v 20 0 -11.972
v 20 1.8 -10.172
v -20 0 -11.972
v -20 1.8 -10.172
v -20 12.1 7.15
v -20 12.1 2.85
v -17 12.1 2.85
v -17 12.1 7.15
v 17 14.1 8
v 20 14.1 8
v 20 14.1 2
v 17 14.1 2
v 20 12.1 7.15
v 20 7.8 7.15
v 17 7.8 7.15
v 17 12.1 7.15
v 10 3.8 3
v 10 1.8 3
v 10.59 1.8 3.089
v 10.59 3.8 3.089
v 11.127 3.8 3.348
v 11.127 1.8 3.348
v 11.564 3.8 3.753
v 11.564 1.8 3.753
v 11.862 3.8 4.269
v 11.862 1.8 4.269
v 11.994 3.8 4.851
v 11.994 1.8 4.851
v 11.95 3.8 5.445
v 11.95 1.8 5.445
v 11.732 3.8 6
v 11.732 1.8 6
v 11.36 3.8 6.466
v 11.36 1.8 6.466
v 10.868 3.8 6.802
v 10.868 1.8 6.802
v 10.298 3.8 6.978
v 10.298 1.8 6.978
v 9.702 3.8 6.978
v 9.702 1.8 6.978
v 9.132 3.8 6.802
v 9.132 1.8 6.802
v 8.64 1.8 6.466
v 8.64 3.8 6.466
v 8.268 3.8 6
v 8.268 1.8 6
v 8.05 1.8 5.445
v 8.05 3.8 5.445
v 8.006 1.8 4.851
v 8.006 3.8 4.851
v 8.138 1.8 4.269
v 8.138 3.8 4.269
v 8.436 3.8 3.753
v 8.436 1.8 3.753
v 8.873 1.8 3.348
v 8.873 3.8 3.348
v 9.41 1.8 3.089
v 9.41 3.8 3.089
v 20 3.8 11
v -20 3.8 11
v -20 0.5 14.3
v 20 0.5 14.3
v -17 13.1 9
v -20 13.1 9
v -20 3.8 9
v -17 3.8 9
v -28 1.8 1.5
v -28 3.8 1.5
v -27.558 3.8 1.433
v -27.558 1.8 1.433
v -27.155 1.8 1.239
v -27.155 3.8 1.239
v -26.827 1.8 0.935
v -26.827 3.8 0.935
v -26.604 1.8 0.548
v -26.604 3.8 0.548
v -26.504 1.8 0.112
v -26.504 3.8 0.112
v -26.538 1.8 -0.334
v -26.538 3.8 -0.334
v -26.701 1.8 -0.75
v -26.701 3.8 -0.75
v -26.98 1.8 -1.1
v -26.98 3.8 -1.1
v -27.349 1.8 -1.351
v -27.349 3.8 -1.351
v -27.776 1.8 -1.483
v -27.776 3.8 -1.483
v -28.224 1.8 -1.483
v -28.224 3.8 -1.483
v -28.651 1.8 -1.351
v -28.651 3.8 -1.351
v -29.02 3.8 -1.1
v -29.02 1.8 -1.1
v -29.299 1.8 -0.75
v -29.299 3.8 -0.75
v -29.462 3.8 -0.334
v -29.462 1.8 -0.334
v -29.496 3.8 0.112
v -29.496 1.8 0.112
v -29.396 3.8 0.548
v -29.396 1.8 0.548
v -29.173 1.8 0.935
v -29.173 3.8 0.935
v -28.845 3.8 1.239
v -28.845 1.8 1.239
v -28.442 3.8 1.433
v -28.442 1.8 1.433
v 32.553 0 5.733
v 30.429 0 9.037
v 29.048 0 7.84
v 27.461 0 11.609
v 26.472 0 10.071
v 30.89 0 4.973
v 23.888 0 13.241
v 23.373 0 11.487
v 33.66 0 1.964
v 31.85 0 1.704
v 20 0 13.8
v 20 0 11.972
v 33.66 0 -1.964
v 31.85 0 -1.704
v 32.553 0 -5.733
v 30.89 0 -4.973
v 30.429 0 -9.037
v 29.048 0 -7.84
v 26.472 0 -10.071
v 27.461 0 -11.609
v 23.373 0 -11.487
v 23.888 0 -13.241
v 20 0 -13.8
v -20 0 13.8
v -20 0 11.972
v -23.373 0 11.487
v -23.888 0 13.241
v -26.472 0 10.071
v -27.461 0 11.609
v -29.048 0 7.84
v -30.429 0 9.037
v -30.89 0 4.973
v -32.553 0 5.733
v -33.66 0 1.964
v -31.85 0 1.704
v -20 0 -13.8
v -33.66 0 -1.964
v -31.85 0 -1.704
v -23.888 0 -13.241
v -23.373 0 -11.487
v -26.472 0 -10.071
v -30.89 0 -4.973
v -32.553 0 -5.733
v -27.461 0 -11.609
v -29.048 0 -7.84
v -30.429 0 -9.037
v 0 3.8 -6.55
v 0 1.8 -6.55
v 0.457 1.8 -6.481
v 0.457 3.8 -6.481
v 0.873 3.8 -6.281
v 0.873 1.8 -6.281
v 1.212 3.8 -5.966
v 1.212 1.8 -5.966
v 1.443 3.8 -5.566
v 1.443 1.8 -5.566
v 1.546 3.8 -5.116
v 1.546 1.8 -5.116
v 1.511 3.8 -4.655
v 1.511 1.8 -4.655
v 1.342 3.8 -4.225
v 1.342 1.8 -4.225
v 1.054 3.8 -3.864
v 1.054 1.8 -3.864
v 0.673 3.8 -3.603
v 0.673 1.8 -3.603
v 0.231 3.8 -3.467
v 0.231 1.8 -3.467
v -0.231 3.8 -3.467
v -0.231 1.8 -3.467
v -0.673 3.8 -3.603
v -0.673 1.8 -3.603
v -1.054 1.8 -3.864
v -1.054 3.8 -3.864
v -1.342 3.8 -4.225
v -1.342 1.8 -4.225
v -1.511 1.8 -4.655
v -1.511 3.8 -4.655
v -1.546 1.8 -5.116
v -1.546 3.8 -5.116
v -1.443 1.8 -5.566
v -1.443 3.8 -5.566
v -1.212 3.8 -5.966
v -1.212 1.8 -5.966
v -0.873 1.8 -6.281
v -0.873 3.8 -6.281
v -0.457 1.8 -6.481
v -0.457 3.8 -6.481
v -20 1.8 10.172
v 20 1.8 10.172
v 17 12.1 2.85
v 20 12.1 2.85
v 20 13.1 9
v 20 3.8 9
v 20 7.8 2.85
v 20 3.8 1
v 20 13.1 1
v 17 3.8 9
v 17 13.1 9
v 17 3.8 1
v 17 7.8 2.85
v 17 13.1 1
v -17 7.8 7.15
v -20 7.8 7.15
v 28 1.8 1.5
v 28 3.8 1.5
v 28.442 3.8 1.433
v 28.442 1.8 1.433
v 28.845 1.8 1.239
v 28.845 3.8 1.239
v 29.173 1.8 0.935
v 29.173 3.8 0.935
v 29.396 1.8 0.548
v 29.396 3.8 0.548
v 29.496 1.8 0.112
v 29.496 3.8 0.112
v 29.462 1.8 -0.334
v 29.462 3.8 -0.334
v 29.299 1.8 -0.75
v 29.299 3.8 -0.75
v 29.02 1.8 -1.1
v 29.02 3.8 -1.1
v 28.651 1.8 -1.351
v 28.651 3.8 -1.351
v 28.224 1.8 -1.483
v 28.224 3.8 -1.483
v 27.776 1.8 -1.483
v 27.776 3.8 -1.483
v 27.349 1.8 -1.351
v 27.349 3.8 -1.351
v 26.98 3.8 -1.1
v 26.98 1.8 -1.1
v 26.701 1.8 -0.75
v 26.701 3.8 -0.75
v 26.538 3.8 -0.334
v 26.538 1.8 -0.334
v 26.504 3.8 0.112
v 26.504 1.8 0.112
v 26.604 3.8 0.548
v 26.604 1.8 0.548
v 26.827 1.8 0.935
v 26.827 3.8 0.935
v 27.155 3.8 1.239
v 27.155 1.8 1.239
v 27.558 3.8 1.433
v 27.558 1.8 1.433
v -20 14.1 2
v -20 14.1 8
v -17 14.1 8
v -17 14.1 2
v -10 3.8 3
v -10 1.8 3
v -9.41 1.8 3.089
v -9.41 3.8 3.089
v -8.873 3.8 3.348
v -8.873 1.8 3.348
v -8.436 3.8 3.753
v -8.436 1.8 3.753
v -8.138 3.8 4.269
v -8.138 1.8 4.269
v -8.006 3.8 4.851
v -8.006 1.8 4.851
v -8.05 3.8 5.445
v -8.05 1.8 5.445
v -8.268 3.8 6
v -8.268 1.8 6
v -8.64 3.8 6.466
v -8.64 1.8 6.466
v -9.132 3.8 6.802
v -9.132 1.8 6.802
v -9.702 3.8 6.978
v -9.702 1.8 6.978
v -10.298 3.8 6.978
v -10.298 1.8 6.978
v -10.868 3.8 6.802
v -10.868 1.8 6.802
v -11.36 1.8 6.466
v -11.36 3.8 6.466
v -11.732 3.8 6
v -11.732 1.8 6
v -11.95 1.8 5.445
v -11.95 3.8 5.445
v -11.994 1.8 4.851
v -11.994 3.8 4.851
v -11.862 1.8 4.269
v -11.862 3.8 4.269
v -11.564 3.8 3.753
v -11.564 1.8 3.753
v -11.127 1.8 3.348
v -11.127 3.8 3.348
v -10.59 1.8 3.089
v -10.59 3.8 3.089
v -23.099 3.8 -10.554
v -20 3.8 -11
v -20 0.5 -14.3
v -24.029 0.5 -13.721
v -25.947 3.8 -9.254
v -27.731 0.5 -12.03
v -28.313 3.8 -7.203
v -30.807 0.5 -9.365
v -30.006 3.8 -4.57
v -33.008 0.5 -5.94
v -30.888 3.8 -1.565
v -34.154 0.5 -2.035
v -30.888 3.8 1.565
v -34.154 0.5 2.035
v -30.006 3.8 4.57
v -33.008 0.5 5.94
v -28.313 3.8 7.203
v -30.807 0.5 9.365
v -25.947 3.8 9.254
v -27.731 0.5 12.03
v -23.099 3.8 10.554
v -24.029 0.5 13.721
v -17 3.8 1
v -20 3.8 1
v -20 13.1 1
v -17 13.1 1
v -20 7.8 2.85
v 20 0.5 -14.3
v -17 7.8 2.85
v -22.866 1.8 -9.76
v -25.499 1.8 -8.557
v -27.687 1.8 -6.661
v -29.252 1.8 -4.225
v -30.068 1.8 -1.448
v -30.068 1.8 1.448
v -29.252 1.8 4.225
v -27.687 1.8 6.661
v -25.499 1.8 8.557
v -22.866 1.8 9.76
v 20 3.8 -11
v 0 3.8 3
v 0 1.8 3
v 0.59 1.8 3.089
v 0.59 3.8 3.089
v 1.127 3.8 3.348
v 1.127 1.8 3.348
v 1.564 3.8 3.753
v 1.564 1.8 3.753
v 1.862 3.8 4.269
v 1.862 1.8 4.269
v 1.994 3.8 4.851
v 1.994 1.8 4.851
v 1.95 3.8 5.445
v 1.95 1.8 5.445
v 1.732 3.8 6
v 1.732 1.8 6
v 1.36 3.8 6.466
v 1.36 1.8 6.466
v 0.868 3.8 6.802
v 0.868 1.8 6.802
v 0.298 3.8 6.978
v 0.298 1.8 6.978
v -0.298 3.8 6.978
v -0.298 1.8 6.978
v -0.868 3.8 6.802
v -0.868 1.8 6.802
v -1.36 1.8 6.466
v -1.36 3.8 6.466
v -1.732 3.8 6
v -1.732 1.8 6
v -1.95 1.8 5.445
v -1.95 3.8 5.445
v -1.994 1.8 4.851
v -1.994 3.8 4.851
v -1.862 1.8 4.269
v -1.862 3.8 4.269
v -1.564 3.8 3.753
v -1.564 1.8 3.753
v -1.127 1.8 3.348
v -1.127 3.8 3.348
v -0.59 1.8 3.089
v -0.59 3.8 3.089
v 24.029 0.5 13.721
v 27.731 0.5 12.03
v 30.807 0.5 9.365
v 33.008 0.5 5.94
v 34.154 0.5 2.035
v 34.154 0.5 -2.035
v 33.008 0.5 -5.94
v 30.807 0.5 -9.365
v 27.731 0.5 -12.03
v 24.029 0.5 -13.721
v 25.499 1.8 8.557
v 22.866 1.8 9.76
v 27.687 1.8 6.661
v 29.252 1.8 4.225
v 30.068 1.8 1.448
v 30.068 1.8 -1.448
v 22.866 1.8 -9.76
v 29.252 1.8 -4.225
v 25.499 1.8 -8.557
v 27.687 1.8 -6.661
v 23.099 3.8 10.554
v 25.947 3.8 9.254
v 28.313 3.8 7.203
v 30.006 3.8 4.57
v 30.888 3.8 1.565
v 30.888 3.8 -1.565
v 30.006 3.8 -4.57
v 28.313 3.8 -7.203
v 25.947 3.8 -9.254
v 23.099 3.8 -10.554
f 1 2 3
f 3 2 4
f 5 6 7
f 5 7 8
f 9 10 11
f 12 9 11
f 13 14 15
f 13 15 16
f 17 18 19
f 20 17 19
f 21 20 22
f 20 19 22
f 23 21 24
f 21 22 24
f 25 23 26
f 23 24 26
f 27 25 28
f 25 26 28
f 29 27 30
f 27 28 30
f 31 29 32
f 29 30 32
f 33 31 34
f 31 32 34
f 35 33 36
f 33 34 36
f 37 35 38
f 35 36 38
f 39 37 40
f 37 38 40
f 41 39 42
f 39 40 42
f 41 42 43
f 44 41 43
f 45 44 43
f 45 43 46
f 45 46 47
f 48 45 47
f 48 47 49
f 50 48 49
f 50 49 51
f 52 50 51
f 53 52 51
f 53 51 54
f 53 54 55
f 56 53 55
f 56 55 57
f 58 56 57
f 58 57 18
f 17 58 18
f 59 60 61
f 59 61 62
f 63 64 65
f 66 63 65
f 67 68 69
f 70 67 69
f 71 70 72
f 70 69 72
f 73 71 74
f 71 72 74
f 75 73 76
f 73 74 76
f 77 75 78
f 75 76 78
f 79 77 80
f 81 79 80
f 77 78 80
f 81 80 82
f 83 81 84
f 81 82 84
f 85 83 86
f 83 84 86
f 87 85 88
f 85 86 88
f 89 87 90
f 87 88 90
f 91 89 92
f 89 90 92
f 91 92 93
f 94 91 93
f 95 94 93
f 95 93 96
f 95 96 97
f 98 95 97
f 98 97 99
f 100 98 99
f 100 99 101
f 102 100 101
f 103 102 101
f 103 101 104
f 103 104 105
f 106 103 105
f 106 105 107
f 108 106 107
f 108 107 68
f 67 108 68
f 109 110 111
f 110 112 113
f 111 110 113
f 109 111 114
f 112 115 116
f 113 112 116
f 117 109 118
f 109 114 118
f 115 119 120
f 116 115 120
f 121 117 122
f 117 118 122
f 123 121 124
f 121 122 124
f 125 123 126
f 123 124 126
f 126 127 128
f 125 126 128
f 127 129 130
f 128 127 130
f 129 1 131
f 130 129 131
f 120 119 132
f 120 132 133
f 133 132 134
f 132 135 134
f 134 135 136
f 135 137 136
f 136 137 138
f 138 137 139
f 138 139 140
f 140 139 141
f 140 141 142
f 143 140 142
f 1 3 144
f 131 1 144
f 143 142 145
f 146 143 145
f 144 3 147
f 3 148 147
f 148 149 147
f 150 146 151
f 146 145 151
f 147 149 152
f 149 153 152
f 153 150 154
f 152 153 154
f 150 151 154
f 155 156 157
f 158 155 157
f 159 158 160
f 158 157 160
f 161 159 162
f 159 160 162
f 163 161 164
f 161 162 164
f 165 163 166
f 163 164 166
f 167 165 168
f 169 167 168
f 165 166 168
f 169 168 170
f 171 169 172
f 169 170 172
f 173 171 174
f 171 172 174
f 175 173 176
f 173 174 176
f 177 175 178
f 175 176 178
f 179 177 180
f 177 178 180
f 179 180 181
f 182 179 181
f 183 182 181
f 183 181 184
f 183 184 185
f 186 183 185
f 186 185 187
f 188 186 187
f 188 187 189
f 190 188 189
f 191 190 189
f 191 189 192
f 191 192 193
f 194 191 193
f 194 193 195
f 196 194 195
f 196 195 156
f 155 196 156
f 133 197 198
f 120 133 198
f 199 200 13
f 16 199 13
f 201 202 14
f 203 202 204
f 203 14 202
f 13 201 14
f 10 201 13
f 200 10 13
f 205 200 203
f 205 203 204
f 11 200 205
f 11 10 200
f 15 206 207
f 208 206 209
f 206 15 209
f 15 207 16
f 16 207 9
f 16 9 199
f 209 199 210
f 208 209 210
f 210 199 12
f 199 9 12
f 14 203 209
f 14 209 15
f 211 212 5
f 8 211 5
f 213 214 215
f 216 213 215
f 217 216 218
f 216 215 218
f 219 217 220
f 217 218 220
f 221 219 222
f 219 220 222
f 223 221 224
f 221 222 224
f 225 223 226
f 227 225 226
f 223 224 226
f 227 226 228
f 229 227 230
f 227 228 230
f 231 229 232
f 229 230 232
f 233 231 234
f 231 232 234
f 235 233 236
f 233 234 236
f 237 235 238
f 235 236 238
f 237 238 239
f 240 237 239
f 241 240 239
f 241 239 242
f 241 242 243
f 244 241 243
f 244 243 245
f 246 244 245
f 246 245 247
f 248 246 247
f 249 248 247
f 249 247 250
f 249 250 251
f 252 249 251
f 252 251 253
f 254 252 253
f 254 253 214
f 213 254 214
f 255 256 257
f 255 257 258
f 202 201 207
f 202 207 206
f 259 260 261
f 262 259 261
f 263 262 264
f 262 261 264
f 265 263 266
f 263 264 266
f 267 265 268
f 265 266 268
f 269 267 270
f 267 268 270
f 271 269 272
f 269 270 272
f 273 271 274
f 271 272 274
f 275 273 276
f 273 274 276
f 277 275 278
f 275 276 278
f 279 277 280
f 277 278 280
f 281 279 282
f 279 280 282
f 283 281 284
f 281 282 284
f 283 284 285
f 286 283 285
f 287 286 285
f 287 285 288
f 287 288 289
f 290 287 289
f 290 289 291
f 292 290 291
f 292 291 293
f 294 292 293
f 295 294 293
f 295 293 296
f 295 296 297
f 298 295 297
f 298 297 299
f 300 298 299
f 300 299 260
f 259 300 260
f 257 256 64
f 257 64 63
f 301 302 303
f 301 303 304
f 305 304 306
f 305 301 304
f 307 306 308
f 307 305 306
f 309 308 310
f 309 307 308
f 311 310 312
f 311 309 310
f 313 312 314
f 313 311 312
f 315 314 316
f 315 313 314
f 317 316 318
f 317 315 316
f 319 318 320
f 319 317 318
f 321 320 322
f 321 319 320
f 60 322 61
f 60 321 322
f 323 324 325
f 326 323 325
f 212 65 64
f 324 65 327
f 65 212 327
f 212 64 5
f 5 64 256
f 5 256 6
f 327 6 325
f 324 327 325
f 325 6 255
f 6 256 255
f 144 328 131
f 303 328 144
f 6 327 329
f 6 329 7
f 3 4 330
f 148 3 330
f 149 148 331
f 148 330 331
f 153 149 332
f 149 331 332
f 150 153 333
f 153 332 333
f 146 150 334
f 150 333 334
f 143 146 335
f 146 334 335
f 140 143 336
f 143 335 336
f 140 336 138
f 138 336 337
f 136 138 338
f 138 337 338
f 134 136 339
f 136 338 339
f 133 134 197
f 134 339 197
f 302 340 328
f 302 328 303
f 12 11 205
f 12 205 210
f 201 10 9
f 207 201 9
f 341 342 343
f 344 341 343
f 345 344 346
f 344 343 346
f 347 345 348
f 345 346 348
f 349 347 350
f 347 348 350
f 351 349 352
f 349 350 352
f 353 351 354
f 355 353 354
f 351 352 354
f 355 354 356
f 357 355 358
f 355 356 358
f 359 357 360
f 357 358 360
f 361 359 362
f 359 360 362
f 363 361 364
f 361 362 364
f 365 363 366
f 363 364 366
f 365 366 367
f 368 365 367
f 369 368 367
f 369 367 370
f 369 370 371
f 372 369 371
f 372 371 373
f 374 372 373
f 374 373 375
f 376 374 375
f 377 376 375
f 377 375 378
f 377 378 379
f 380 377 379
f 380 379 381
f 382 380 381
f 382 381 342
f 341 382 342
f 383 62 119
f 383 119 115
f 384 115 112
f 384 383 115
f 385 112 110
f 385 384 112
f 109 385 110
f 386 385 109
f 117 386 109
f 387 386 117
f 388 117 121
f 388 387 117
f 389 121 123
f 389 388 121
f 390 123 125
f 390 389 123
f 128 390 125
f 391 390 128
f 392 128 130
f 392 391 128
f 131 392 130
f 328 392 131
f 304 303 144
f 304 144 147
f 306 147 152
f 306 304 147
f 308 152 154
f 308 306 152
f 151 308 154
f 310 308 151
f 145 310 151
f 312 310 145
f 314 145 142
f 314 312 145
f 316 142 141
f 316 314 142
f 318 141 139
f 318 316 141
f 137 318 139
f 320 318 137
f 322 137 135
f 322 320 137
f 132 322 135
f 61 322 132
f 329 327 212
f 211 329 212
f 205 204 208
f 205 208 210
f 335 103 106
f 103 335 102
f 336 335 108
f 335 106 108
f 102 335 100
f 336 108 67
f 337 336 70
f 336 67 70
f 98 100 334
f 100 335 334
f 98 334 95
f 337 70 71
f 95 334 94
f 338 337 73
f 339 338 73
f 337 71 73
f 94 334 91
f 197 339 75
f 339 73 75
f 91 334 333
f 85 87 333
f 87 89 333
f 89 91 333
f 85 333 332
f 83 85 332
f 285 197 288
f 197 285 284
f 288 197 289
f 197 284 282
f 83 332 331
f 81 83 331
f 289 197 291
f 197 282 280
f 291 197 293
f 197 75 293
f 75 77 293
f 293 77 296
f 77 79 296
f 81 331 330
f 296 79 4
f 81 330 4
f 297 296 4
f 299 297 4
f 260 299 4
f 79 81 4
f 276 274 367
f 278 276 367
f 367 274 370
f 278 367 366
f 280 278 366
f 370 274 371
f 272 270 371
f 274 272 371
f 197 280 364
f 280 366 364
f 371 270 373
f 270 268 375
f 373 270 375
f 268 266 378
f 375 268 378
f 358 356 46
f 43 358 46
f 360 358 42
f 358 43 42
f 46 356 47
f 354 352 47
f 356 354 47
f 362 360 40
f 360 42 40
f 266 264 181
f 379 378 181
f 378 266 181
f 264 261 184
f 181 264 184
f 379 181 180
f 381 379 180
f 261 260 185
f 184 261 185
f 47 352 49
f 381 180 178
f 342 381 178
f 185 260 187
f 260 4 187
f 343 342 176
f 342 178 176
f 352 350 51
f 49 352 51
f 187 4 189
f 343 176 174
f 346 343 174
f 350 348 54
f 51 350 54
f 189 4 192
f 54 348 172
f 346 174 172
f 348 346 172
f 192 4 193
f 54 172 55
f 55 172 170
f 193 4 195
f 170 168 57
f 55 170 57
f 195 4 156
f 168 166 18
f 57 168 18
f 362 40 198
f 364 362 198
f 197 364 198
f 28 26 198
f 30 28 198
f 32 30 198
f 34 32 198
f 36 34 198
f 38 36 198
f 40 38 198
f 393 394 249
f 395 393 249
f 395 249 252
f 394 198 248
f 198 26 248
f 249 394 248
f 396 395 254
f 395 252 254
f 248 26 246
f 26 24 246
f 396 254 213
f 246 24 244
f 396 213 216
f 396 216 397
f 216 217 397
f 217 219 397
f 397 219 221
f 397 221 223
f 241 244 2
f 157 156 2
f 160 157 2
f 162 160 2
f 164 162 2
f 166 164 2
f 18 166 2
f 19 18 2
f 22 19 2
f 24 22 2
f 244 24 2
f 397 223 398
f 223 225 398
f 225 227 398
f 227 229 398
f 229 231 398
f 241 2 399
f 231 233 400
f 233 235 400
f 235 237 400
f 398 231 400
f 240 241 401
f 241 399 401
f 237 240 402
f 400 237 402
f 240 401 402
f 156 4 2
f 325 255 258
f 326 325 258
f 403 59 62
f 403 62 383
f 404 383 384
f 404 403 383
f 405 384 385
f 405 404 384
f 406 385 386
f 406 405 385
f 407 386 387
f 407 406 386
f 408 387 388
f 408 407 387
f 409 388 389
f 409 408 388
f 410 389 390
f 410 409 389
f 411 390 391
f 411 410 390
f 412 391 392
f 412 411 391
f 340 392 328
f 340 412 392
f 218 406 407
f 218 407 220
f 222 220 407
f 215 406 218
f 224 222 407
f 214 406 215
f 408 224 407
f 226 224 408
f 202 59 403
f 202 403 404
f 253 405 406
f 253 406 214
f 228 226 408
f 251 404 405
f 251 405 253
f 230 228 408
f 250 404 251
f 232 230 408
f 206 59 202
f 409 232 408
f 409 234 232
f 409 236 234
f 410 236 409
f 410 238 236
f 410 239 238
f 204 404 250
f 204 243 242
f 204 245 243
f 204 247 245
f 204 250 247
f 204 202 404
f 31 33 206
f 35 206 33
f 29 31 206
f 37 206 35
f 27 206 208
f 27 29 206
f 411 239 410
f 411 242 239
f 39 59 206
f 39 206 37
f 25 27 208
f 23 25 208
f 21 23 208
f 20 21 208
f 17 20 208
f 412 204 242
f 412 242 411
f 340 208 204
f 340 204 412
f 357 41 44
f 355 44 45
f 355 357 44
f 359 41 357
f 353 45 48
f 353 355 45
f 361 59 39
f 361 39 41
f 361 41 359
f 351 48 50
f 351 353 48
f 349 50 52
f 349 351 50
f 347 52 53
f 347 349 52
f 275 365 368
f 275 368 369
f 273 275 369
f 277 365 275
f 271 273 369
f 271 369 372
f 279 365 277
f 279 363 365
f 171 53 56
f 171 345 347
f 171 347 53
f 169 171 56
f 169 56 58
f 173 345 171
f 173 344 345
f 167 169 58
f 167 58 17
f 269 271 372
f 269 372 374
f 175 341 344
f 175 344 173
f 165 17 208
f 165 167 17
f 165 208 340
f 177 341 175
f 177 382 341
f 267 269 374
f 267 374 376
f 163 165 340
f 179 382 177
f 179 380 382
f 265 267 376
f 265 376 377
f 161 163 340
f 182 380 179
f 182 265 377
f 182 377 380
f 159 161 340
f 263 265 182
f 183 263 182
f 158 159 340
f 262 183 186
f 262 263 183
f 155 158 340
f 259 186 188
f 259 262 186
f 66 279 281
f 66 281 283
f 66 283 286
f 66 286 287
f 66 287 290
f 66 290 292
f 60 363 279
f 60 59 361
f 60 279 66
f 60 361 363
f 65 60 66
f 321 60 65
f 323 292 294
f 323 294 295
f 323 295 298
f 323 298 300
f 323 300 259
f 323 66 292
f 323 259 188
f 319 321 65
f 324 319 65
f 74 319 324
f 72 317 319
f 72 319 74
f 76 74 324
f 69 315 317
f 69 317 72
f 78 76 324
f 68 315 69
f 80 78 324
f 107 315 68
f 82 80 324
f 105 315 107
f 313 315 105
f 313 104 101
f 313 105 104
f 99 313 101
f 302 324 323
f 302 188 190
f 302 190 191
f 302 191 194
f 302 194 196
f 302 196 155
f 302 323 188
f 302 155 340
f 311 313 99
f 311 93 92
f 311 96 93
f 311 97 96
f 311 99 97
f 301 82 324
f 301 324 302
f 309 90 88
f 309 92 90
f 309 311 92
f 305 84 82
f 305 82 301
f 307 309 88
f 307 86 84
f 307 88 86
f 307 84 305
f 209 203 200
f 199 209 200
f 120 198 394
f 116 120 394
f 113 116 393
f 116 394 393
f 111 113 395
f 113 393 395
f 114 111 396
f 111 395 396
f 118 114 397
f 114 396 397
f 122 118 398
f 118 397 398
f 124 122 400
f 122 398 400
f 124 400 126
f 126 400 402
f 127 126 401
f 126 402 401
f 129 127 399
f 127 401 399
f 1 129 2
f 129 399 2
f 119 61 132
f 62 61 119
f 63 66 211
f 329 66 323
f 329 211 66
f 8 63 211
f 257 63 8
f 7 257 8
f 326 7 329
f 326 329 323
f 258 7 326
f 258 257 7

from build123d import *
from OCP.BRepFilletAPI import BRepFilletAPI_MakeChamfer

# Parameters (mm, degrees)
BOSS_EXTRU_1_DEPTH           = 3.8
BOSS_EXTRU_1_TAPER           = 45
COQUE2_DEPTH                 = 1.8
COQUE2_DRAFT                 = 45
CHANFREIN1_SIZE              = 1
CHANFREIN1_SIZE2             = 0.707106781
ENL_V_MAT_EXTRU_1_REACH      = 39.355
ESQUISSE2_R                  = 1.5
ENL_V_MAT_EXTRU_2_REACH      = 39.215
ESQUISSE3_R                  = 1.55
ESQUISSE3_R_2                = 2
ESQUISSE4_W                  = 4.3
ESQUISSE4_H                  = 4.3
BOSS_EXTRU_2_DEPTH           = 3
CHANFREIN2_SIZE              = 1
CHANFREIN2_OF_SYM_TRIE1_SIZE = 1


# Read off the part's stored shape, not the designer's step: Coque2
with BuildPart() as part:
    # Esquisse1 → Boss.-Extru.1 (new body)
    with BuildSketch(Plane(origin=(0, 0, 0), x_dir=(1, 0, 0), z_dir=(0, 1, 0))):
        with BuildLine():
            ThreePointArc((-20, 14.8), (-34.8, 0), (-20, -14.8))
            Line((-20, -14.8), (20, -14.8))
            ThreePointArc((20, -14.8), (34.8, 0), (20, 14.8))
            Line((20, 14.8), (-20, 14.8))
        make_face()
    extrude(amount=BOSS_EXTRU_1_DEPTH, taper=BOSS_EXTRU_1_TAPER)


with BuildPart() as coque2_tool:
    # Coque2 outline → Coque2 (with draft: the straight prism first)
    with BuildSketch(Plane(origin=(0, 1.8, 0), x_dir=(1, 0, 0), z_dir=(0, 1, 0))):
        with BuildLine():
            Line((-20, -10.171572875), (20, -10.171572875))
            ThreePointArc((20, -10.171572875), (30.171572875, 0), (20, 10.171572875))
            Line((20, 10.171572875), (-20, 10.171572875))
            ThreePointArc((-20, 10.171572875), (-30.171572875, 0), (-20, -10.171572875))
        make_face()
    extrude(amount=-COQUE2_DEPTH)
    # Coque2: the draft: its side faces are tilted about the plane it starts from
    coque2_sides = [coque2_tool.faces().sort_by_distance(p)[0] for p in [
        (0, 0.9, 10.171572875),
        (30.171572875, 0.9, 0),
        (0, 0.9, -10.171572875),
        (-30.171572875, 0.9, 0),
    ]]
    draft(coque2_sides, Plane(origin=(0, 1.8, 0), x_dir=(1, 0, 0), z_dir=(0, 1, 0)), COQUE2_DRAFT)


with BuildPart() as part_1:
    add(part.part)

    # Coque2: cut by coque2_tool
    add(coque2_tool.part, mode=Mode.SUBTRACT)

    # Chanfrein1: one chamfer whose edges measure the first distance from different faces: ONE call of the kernel's chamfer builder (chamfer() names one face for all edges)
    chanfrein1_edges_1 = [part_1.edges().sort_by_distance(p)[0] for p in [
        (0, 0, -14.8),
        (0, 0, 14.8),
        (-34.8, 0, 0),
    ]]
    chanfrein1_side_1 = [part_1.faces().sort_by_distance(p)[0] for p in [
        (0, 0, -14.043672029),
    ]]
    chanfrein1_edges_2 = [part_1.edges().sort_by_distance(p)[0] for p in [
        (34.8, 0, 0),
    ]]
    chanfrein1_side_2 = [part_1.faces().sort_by_distance(p)[0] for p in [
        (32.9, 1.9, 0),
    ]]
    chanfrein1 = BRepFilletAPI_MakeChamfer(part_1.part.solid().wrapped)
    for e in chanfrein1_edges_1:
        chanfrein1.Add(CHANFREIN1_SIZE, CHANFREIN1_SIZE2, e.wrapped, chanfrein1_side_1[0].wrapped)  # the first distance lies on this face
    for e in chanfrein1_edges_2:
        chanfrein1.Add(CHANFREIN1_SIZE, CHANFREIN1_SIZE2, e.wrapped, chanfrein1_side_2[0].wrapped)  # the first distance lies on this face
    add(Compound.cast(chanfrein1.Shape()), mode=Mode.REPLACE)

    # Esquisse2 → Enlèv. mat.-Extru.1 (cut, up to next)
    with BuildSketch(Plane(origin=(0, 3.8, 0), x_dir=(1, 0, 0), z_dir=(0, 1, 0)), mode=Mode.PRIVATE) as enl_v_mat_extru_1_sk1:
        with Locations(Location((-28, 0, 0), (0, 0, 270))):
            Circle(ESQUISSE2_R)
    enl_v_mat_extru_1_tool1 = extrude(enl_v_mat_extru_1_sk1.sketch, amount=-ENL_V_MAT_EXTRU_1_REACH, mode=Mode.PRIVATE) & part_1.part
    # Esquisse2 → Enlèv. mat.-Extru.1 (cut, up to next)
    with BuildSketch(Plane(origin=(0, 3.8, 0), x_dir=(1, 0, 0), z_dir=(0, 1, 0)), mode=Mode.PRIVATE) as enl_v_mat_extru_1_sk2:
        with Locations(Location((28, 0, 0), (0, 0, 270))):
            Circle(ESQUISSE2_R)
    enl_v_mat_extru_1_tool2 = extrude(enl_v_mat_extru_1_sk2.sketch, amount=-ENL_V_MAT_EXTRU_1_REACH, mode=Mode.PRIVATE) & part_1.part
    add(enl_v_mat_extru_1_tool1.solids().sort_by_distance((-28, 3.8, 0))[0], mode=Mode.SUBTRACT)
    add(enl_v_mat_extru_1_tool2.solids().sort_by_distance((28, 3.8, 0))[0], mode=Mode.SUBTRACT)

    # Esquisse3 → Enlèv. mat.-Extru.2 (cut, up to next)
    with BuildSketch(Plane.XZ.offset(-1.8), mode=Mode.PRIVATE) as enl_v_mat_extru_2_sk1:
        with Locations(Location((0, -5, 0), (0, 0, 270))):
            Circle(ESQUISSE3_R)
    enl_v_mat_extru_2_tool1 = extrude(enl_v_mat_extru_2_sk1.sketch, amount=-ENL_V_MAT_EXTRU_2_REACH, mode=Mode.PRIVATE) & part_1.part
    # Esquisse3 → Enlèv. mat.-Extru.2 (cut, up to next)
    with BuildSketch(Plane.XZ.offset(-1.8), mode=Mode.PRIVATE) as enl_v_mat_extru_2_sk2:
        with Locations(Location((10, 5, 0), (0, 0, 270))):
            Circle(ESQUISSE3_R_2)
    enl_v_mat_extru_2_tool2 = extrude(enl_v_mat_extru_2_sk2.sketch, amount=-ENL_V_MAT_EXTRU_2_REACH, mode=Mode.PRIVATE) & part_1.part
    # Esquisse3 → Enlèv. mat.-Extru.2 (cut, up to next)
    with BuildSketch(Plane.XZ.offset(-1.8), mode=Mode.PRIVATE) as enl_v_mat_extru_2_sk3:
        with Locations(Location((0, 5, 0), (0, 0, 270))):
            Circle(ESQUISSE3_R_2)
    enl_v_mat_extru_2_tool3 = extrude(enl_v_mat_extru_2_sk3.sketch, amount=-ENL_V_MAT_EXTRU_2_REACH, mode=Mode.PRIVATE) & part_1.part
    # Esquisse3 → Enlèv. mat.-Extru.2 (cut, up to next)
    with BuildSketch(Plane.XZ.offset(-1.8), mode=Mode.PRIVATE) as enl_v_mat_extru_2_sk4:
        with Locations(Location((-10, 5, 0), (0, 0, 270))):
            Circle(ESQUISSE3_R_2)
    enl_v_mat_extru_2_tool4 = extrude(enl_v_mat_extru_2_sk4.sketch, amount=-ENL_V_MAT_EXTRU_2_REACH, mode=Mode.PRIVATE) & part_1.part
    add(enl_v_mat_extru_2_tool1.solids().sort_by_distance((0, 1.8, -5))[0], mode=Mode.SUBTRACT)
    add(enl_v_mat_extru_2_tool2.solids().sort_by_distance((10, 1.8, 5))[0], mode=Mode.SUBTRACT)
    add(enl_v_mat_extru_2_tool3.solids().sort_by_distance((0, 1.8, 5))[0], mode=Mode.SUBTRACT)
    add(enl_v_mat_extru_2_tool4.solids().sort_by_distance((-10, 1.8, 5))[0], mode=Mode.SUBTRACT)

    # Esquisse4 → Boss.-Extru.2 (add)
    with BuildSketch(Plane.ZY.offset(-20)):
        Polygon((9, 3.8), (1, 3.8), (1, 14.1), (5, 14.1), (9, 14.1), align=None)
        with Locations((5, 9.95)):
            Rectangle(ESQUISSE4_W, ESQUISSE4_H, mode=Mode.SUBTRACT)
    boss_extru_2 = extrude(amount=BOSS_EXTRU_2_DEPTH)

    # Chanfrein2
    chanfrein2_edges = [part_1.edges().sort_by_distance(p)[0] for p in [
        (18.5, 14.1, 9),
        (18.5, 14.1, 1),
    ]]
    chamfer(chanfrein2_edges, length=CHANFREIN2_SIZE)

    # Symétrie1: Boss.-Extru.2 across plane
    add(boss_extru_2.mirror(Plane(origin=(0, 0, 0), x_dir=(0, 0, 1), z_dir=(1, 0, 0))))

    # Chanfrein2 of Symétrie1
    chanfrein2_of_sym_trie1_edges = [part_1.edges().sort_by_distance(p)[0] for p in [
        (-18.5, 14.1, 9),
        (-18.5, 14.1, 1),
    ]]
    chamfer(chanfrein2_of_sym_trie1_edges, length=CHANFREIN2_OF_SYM_TRIE1_SIZE)


solid = part_1.part
